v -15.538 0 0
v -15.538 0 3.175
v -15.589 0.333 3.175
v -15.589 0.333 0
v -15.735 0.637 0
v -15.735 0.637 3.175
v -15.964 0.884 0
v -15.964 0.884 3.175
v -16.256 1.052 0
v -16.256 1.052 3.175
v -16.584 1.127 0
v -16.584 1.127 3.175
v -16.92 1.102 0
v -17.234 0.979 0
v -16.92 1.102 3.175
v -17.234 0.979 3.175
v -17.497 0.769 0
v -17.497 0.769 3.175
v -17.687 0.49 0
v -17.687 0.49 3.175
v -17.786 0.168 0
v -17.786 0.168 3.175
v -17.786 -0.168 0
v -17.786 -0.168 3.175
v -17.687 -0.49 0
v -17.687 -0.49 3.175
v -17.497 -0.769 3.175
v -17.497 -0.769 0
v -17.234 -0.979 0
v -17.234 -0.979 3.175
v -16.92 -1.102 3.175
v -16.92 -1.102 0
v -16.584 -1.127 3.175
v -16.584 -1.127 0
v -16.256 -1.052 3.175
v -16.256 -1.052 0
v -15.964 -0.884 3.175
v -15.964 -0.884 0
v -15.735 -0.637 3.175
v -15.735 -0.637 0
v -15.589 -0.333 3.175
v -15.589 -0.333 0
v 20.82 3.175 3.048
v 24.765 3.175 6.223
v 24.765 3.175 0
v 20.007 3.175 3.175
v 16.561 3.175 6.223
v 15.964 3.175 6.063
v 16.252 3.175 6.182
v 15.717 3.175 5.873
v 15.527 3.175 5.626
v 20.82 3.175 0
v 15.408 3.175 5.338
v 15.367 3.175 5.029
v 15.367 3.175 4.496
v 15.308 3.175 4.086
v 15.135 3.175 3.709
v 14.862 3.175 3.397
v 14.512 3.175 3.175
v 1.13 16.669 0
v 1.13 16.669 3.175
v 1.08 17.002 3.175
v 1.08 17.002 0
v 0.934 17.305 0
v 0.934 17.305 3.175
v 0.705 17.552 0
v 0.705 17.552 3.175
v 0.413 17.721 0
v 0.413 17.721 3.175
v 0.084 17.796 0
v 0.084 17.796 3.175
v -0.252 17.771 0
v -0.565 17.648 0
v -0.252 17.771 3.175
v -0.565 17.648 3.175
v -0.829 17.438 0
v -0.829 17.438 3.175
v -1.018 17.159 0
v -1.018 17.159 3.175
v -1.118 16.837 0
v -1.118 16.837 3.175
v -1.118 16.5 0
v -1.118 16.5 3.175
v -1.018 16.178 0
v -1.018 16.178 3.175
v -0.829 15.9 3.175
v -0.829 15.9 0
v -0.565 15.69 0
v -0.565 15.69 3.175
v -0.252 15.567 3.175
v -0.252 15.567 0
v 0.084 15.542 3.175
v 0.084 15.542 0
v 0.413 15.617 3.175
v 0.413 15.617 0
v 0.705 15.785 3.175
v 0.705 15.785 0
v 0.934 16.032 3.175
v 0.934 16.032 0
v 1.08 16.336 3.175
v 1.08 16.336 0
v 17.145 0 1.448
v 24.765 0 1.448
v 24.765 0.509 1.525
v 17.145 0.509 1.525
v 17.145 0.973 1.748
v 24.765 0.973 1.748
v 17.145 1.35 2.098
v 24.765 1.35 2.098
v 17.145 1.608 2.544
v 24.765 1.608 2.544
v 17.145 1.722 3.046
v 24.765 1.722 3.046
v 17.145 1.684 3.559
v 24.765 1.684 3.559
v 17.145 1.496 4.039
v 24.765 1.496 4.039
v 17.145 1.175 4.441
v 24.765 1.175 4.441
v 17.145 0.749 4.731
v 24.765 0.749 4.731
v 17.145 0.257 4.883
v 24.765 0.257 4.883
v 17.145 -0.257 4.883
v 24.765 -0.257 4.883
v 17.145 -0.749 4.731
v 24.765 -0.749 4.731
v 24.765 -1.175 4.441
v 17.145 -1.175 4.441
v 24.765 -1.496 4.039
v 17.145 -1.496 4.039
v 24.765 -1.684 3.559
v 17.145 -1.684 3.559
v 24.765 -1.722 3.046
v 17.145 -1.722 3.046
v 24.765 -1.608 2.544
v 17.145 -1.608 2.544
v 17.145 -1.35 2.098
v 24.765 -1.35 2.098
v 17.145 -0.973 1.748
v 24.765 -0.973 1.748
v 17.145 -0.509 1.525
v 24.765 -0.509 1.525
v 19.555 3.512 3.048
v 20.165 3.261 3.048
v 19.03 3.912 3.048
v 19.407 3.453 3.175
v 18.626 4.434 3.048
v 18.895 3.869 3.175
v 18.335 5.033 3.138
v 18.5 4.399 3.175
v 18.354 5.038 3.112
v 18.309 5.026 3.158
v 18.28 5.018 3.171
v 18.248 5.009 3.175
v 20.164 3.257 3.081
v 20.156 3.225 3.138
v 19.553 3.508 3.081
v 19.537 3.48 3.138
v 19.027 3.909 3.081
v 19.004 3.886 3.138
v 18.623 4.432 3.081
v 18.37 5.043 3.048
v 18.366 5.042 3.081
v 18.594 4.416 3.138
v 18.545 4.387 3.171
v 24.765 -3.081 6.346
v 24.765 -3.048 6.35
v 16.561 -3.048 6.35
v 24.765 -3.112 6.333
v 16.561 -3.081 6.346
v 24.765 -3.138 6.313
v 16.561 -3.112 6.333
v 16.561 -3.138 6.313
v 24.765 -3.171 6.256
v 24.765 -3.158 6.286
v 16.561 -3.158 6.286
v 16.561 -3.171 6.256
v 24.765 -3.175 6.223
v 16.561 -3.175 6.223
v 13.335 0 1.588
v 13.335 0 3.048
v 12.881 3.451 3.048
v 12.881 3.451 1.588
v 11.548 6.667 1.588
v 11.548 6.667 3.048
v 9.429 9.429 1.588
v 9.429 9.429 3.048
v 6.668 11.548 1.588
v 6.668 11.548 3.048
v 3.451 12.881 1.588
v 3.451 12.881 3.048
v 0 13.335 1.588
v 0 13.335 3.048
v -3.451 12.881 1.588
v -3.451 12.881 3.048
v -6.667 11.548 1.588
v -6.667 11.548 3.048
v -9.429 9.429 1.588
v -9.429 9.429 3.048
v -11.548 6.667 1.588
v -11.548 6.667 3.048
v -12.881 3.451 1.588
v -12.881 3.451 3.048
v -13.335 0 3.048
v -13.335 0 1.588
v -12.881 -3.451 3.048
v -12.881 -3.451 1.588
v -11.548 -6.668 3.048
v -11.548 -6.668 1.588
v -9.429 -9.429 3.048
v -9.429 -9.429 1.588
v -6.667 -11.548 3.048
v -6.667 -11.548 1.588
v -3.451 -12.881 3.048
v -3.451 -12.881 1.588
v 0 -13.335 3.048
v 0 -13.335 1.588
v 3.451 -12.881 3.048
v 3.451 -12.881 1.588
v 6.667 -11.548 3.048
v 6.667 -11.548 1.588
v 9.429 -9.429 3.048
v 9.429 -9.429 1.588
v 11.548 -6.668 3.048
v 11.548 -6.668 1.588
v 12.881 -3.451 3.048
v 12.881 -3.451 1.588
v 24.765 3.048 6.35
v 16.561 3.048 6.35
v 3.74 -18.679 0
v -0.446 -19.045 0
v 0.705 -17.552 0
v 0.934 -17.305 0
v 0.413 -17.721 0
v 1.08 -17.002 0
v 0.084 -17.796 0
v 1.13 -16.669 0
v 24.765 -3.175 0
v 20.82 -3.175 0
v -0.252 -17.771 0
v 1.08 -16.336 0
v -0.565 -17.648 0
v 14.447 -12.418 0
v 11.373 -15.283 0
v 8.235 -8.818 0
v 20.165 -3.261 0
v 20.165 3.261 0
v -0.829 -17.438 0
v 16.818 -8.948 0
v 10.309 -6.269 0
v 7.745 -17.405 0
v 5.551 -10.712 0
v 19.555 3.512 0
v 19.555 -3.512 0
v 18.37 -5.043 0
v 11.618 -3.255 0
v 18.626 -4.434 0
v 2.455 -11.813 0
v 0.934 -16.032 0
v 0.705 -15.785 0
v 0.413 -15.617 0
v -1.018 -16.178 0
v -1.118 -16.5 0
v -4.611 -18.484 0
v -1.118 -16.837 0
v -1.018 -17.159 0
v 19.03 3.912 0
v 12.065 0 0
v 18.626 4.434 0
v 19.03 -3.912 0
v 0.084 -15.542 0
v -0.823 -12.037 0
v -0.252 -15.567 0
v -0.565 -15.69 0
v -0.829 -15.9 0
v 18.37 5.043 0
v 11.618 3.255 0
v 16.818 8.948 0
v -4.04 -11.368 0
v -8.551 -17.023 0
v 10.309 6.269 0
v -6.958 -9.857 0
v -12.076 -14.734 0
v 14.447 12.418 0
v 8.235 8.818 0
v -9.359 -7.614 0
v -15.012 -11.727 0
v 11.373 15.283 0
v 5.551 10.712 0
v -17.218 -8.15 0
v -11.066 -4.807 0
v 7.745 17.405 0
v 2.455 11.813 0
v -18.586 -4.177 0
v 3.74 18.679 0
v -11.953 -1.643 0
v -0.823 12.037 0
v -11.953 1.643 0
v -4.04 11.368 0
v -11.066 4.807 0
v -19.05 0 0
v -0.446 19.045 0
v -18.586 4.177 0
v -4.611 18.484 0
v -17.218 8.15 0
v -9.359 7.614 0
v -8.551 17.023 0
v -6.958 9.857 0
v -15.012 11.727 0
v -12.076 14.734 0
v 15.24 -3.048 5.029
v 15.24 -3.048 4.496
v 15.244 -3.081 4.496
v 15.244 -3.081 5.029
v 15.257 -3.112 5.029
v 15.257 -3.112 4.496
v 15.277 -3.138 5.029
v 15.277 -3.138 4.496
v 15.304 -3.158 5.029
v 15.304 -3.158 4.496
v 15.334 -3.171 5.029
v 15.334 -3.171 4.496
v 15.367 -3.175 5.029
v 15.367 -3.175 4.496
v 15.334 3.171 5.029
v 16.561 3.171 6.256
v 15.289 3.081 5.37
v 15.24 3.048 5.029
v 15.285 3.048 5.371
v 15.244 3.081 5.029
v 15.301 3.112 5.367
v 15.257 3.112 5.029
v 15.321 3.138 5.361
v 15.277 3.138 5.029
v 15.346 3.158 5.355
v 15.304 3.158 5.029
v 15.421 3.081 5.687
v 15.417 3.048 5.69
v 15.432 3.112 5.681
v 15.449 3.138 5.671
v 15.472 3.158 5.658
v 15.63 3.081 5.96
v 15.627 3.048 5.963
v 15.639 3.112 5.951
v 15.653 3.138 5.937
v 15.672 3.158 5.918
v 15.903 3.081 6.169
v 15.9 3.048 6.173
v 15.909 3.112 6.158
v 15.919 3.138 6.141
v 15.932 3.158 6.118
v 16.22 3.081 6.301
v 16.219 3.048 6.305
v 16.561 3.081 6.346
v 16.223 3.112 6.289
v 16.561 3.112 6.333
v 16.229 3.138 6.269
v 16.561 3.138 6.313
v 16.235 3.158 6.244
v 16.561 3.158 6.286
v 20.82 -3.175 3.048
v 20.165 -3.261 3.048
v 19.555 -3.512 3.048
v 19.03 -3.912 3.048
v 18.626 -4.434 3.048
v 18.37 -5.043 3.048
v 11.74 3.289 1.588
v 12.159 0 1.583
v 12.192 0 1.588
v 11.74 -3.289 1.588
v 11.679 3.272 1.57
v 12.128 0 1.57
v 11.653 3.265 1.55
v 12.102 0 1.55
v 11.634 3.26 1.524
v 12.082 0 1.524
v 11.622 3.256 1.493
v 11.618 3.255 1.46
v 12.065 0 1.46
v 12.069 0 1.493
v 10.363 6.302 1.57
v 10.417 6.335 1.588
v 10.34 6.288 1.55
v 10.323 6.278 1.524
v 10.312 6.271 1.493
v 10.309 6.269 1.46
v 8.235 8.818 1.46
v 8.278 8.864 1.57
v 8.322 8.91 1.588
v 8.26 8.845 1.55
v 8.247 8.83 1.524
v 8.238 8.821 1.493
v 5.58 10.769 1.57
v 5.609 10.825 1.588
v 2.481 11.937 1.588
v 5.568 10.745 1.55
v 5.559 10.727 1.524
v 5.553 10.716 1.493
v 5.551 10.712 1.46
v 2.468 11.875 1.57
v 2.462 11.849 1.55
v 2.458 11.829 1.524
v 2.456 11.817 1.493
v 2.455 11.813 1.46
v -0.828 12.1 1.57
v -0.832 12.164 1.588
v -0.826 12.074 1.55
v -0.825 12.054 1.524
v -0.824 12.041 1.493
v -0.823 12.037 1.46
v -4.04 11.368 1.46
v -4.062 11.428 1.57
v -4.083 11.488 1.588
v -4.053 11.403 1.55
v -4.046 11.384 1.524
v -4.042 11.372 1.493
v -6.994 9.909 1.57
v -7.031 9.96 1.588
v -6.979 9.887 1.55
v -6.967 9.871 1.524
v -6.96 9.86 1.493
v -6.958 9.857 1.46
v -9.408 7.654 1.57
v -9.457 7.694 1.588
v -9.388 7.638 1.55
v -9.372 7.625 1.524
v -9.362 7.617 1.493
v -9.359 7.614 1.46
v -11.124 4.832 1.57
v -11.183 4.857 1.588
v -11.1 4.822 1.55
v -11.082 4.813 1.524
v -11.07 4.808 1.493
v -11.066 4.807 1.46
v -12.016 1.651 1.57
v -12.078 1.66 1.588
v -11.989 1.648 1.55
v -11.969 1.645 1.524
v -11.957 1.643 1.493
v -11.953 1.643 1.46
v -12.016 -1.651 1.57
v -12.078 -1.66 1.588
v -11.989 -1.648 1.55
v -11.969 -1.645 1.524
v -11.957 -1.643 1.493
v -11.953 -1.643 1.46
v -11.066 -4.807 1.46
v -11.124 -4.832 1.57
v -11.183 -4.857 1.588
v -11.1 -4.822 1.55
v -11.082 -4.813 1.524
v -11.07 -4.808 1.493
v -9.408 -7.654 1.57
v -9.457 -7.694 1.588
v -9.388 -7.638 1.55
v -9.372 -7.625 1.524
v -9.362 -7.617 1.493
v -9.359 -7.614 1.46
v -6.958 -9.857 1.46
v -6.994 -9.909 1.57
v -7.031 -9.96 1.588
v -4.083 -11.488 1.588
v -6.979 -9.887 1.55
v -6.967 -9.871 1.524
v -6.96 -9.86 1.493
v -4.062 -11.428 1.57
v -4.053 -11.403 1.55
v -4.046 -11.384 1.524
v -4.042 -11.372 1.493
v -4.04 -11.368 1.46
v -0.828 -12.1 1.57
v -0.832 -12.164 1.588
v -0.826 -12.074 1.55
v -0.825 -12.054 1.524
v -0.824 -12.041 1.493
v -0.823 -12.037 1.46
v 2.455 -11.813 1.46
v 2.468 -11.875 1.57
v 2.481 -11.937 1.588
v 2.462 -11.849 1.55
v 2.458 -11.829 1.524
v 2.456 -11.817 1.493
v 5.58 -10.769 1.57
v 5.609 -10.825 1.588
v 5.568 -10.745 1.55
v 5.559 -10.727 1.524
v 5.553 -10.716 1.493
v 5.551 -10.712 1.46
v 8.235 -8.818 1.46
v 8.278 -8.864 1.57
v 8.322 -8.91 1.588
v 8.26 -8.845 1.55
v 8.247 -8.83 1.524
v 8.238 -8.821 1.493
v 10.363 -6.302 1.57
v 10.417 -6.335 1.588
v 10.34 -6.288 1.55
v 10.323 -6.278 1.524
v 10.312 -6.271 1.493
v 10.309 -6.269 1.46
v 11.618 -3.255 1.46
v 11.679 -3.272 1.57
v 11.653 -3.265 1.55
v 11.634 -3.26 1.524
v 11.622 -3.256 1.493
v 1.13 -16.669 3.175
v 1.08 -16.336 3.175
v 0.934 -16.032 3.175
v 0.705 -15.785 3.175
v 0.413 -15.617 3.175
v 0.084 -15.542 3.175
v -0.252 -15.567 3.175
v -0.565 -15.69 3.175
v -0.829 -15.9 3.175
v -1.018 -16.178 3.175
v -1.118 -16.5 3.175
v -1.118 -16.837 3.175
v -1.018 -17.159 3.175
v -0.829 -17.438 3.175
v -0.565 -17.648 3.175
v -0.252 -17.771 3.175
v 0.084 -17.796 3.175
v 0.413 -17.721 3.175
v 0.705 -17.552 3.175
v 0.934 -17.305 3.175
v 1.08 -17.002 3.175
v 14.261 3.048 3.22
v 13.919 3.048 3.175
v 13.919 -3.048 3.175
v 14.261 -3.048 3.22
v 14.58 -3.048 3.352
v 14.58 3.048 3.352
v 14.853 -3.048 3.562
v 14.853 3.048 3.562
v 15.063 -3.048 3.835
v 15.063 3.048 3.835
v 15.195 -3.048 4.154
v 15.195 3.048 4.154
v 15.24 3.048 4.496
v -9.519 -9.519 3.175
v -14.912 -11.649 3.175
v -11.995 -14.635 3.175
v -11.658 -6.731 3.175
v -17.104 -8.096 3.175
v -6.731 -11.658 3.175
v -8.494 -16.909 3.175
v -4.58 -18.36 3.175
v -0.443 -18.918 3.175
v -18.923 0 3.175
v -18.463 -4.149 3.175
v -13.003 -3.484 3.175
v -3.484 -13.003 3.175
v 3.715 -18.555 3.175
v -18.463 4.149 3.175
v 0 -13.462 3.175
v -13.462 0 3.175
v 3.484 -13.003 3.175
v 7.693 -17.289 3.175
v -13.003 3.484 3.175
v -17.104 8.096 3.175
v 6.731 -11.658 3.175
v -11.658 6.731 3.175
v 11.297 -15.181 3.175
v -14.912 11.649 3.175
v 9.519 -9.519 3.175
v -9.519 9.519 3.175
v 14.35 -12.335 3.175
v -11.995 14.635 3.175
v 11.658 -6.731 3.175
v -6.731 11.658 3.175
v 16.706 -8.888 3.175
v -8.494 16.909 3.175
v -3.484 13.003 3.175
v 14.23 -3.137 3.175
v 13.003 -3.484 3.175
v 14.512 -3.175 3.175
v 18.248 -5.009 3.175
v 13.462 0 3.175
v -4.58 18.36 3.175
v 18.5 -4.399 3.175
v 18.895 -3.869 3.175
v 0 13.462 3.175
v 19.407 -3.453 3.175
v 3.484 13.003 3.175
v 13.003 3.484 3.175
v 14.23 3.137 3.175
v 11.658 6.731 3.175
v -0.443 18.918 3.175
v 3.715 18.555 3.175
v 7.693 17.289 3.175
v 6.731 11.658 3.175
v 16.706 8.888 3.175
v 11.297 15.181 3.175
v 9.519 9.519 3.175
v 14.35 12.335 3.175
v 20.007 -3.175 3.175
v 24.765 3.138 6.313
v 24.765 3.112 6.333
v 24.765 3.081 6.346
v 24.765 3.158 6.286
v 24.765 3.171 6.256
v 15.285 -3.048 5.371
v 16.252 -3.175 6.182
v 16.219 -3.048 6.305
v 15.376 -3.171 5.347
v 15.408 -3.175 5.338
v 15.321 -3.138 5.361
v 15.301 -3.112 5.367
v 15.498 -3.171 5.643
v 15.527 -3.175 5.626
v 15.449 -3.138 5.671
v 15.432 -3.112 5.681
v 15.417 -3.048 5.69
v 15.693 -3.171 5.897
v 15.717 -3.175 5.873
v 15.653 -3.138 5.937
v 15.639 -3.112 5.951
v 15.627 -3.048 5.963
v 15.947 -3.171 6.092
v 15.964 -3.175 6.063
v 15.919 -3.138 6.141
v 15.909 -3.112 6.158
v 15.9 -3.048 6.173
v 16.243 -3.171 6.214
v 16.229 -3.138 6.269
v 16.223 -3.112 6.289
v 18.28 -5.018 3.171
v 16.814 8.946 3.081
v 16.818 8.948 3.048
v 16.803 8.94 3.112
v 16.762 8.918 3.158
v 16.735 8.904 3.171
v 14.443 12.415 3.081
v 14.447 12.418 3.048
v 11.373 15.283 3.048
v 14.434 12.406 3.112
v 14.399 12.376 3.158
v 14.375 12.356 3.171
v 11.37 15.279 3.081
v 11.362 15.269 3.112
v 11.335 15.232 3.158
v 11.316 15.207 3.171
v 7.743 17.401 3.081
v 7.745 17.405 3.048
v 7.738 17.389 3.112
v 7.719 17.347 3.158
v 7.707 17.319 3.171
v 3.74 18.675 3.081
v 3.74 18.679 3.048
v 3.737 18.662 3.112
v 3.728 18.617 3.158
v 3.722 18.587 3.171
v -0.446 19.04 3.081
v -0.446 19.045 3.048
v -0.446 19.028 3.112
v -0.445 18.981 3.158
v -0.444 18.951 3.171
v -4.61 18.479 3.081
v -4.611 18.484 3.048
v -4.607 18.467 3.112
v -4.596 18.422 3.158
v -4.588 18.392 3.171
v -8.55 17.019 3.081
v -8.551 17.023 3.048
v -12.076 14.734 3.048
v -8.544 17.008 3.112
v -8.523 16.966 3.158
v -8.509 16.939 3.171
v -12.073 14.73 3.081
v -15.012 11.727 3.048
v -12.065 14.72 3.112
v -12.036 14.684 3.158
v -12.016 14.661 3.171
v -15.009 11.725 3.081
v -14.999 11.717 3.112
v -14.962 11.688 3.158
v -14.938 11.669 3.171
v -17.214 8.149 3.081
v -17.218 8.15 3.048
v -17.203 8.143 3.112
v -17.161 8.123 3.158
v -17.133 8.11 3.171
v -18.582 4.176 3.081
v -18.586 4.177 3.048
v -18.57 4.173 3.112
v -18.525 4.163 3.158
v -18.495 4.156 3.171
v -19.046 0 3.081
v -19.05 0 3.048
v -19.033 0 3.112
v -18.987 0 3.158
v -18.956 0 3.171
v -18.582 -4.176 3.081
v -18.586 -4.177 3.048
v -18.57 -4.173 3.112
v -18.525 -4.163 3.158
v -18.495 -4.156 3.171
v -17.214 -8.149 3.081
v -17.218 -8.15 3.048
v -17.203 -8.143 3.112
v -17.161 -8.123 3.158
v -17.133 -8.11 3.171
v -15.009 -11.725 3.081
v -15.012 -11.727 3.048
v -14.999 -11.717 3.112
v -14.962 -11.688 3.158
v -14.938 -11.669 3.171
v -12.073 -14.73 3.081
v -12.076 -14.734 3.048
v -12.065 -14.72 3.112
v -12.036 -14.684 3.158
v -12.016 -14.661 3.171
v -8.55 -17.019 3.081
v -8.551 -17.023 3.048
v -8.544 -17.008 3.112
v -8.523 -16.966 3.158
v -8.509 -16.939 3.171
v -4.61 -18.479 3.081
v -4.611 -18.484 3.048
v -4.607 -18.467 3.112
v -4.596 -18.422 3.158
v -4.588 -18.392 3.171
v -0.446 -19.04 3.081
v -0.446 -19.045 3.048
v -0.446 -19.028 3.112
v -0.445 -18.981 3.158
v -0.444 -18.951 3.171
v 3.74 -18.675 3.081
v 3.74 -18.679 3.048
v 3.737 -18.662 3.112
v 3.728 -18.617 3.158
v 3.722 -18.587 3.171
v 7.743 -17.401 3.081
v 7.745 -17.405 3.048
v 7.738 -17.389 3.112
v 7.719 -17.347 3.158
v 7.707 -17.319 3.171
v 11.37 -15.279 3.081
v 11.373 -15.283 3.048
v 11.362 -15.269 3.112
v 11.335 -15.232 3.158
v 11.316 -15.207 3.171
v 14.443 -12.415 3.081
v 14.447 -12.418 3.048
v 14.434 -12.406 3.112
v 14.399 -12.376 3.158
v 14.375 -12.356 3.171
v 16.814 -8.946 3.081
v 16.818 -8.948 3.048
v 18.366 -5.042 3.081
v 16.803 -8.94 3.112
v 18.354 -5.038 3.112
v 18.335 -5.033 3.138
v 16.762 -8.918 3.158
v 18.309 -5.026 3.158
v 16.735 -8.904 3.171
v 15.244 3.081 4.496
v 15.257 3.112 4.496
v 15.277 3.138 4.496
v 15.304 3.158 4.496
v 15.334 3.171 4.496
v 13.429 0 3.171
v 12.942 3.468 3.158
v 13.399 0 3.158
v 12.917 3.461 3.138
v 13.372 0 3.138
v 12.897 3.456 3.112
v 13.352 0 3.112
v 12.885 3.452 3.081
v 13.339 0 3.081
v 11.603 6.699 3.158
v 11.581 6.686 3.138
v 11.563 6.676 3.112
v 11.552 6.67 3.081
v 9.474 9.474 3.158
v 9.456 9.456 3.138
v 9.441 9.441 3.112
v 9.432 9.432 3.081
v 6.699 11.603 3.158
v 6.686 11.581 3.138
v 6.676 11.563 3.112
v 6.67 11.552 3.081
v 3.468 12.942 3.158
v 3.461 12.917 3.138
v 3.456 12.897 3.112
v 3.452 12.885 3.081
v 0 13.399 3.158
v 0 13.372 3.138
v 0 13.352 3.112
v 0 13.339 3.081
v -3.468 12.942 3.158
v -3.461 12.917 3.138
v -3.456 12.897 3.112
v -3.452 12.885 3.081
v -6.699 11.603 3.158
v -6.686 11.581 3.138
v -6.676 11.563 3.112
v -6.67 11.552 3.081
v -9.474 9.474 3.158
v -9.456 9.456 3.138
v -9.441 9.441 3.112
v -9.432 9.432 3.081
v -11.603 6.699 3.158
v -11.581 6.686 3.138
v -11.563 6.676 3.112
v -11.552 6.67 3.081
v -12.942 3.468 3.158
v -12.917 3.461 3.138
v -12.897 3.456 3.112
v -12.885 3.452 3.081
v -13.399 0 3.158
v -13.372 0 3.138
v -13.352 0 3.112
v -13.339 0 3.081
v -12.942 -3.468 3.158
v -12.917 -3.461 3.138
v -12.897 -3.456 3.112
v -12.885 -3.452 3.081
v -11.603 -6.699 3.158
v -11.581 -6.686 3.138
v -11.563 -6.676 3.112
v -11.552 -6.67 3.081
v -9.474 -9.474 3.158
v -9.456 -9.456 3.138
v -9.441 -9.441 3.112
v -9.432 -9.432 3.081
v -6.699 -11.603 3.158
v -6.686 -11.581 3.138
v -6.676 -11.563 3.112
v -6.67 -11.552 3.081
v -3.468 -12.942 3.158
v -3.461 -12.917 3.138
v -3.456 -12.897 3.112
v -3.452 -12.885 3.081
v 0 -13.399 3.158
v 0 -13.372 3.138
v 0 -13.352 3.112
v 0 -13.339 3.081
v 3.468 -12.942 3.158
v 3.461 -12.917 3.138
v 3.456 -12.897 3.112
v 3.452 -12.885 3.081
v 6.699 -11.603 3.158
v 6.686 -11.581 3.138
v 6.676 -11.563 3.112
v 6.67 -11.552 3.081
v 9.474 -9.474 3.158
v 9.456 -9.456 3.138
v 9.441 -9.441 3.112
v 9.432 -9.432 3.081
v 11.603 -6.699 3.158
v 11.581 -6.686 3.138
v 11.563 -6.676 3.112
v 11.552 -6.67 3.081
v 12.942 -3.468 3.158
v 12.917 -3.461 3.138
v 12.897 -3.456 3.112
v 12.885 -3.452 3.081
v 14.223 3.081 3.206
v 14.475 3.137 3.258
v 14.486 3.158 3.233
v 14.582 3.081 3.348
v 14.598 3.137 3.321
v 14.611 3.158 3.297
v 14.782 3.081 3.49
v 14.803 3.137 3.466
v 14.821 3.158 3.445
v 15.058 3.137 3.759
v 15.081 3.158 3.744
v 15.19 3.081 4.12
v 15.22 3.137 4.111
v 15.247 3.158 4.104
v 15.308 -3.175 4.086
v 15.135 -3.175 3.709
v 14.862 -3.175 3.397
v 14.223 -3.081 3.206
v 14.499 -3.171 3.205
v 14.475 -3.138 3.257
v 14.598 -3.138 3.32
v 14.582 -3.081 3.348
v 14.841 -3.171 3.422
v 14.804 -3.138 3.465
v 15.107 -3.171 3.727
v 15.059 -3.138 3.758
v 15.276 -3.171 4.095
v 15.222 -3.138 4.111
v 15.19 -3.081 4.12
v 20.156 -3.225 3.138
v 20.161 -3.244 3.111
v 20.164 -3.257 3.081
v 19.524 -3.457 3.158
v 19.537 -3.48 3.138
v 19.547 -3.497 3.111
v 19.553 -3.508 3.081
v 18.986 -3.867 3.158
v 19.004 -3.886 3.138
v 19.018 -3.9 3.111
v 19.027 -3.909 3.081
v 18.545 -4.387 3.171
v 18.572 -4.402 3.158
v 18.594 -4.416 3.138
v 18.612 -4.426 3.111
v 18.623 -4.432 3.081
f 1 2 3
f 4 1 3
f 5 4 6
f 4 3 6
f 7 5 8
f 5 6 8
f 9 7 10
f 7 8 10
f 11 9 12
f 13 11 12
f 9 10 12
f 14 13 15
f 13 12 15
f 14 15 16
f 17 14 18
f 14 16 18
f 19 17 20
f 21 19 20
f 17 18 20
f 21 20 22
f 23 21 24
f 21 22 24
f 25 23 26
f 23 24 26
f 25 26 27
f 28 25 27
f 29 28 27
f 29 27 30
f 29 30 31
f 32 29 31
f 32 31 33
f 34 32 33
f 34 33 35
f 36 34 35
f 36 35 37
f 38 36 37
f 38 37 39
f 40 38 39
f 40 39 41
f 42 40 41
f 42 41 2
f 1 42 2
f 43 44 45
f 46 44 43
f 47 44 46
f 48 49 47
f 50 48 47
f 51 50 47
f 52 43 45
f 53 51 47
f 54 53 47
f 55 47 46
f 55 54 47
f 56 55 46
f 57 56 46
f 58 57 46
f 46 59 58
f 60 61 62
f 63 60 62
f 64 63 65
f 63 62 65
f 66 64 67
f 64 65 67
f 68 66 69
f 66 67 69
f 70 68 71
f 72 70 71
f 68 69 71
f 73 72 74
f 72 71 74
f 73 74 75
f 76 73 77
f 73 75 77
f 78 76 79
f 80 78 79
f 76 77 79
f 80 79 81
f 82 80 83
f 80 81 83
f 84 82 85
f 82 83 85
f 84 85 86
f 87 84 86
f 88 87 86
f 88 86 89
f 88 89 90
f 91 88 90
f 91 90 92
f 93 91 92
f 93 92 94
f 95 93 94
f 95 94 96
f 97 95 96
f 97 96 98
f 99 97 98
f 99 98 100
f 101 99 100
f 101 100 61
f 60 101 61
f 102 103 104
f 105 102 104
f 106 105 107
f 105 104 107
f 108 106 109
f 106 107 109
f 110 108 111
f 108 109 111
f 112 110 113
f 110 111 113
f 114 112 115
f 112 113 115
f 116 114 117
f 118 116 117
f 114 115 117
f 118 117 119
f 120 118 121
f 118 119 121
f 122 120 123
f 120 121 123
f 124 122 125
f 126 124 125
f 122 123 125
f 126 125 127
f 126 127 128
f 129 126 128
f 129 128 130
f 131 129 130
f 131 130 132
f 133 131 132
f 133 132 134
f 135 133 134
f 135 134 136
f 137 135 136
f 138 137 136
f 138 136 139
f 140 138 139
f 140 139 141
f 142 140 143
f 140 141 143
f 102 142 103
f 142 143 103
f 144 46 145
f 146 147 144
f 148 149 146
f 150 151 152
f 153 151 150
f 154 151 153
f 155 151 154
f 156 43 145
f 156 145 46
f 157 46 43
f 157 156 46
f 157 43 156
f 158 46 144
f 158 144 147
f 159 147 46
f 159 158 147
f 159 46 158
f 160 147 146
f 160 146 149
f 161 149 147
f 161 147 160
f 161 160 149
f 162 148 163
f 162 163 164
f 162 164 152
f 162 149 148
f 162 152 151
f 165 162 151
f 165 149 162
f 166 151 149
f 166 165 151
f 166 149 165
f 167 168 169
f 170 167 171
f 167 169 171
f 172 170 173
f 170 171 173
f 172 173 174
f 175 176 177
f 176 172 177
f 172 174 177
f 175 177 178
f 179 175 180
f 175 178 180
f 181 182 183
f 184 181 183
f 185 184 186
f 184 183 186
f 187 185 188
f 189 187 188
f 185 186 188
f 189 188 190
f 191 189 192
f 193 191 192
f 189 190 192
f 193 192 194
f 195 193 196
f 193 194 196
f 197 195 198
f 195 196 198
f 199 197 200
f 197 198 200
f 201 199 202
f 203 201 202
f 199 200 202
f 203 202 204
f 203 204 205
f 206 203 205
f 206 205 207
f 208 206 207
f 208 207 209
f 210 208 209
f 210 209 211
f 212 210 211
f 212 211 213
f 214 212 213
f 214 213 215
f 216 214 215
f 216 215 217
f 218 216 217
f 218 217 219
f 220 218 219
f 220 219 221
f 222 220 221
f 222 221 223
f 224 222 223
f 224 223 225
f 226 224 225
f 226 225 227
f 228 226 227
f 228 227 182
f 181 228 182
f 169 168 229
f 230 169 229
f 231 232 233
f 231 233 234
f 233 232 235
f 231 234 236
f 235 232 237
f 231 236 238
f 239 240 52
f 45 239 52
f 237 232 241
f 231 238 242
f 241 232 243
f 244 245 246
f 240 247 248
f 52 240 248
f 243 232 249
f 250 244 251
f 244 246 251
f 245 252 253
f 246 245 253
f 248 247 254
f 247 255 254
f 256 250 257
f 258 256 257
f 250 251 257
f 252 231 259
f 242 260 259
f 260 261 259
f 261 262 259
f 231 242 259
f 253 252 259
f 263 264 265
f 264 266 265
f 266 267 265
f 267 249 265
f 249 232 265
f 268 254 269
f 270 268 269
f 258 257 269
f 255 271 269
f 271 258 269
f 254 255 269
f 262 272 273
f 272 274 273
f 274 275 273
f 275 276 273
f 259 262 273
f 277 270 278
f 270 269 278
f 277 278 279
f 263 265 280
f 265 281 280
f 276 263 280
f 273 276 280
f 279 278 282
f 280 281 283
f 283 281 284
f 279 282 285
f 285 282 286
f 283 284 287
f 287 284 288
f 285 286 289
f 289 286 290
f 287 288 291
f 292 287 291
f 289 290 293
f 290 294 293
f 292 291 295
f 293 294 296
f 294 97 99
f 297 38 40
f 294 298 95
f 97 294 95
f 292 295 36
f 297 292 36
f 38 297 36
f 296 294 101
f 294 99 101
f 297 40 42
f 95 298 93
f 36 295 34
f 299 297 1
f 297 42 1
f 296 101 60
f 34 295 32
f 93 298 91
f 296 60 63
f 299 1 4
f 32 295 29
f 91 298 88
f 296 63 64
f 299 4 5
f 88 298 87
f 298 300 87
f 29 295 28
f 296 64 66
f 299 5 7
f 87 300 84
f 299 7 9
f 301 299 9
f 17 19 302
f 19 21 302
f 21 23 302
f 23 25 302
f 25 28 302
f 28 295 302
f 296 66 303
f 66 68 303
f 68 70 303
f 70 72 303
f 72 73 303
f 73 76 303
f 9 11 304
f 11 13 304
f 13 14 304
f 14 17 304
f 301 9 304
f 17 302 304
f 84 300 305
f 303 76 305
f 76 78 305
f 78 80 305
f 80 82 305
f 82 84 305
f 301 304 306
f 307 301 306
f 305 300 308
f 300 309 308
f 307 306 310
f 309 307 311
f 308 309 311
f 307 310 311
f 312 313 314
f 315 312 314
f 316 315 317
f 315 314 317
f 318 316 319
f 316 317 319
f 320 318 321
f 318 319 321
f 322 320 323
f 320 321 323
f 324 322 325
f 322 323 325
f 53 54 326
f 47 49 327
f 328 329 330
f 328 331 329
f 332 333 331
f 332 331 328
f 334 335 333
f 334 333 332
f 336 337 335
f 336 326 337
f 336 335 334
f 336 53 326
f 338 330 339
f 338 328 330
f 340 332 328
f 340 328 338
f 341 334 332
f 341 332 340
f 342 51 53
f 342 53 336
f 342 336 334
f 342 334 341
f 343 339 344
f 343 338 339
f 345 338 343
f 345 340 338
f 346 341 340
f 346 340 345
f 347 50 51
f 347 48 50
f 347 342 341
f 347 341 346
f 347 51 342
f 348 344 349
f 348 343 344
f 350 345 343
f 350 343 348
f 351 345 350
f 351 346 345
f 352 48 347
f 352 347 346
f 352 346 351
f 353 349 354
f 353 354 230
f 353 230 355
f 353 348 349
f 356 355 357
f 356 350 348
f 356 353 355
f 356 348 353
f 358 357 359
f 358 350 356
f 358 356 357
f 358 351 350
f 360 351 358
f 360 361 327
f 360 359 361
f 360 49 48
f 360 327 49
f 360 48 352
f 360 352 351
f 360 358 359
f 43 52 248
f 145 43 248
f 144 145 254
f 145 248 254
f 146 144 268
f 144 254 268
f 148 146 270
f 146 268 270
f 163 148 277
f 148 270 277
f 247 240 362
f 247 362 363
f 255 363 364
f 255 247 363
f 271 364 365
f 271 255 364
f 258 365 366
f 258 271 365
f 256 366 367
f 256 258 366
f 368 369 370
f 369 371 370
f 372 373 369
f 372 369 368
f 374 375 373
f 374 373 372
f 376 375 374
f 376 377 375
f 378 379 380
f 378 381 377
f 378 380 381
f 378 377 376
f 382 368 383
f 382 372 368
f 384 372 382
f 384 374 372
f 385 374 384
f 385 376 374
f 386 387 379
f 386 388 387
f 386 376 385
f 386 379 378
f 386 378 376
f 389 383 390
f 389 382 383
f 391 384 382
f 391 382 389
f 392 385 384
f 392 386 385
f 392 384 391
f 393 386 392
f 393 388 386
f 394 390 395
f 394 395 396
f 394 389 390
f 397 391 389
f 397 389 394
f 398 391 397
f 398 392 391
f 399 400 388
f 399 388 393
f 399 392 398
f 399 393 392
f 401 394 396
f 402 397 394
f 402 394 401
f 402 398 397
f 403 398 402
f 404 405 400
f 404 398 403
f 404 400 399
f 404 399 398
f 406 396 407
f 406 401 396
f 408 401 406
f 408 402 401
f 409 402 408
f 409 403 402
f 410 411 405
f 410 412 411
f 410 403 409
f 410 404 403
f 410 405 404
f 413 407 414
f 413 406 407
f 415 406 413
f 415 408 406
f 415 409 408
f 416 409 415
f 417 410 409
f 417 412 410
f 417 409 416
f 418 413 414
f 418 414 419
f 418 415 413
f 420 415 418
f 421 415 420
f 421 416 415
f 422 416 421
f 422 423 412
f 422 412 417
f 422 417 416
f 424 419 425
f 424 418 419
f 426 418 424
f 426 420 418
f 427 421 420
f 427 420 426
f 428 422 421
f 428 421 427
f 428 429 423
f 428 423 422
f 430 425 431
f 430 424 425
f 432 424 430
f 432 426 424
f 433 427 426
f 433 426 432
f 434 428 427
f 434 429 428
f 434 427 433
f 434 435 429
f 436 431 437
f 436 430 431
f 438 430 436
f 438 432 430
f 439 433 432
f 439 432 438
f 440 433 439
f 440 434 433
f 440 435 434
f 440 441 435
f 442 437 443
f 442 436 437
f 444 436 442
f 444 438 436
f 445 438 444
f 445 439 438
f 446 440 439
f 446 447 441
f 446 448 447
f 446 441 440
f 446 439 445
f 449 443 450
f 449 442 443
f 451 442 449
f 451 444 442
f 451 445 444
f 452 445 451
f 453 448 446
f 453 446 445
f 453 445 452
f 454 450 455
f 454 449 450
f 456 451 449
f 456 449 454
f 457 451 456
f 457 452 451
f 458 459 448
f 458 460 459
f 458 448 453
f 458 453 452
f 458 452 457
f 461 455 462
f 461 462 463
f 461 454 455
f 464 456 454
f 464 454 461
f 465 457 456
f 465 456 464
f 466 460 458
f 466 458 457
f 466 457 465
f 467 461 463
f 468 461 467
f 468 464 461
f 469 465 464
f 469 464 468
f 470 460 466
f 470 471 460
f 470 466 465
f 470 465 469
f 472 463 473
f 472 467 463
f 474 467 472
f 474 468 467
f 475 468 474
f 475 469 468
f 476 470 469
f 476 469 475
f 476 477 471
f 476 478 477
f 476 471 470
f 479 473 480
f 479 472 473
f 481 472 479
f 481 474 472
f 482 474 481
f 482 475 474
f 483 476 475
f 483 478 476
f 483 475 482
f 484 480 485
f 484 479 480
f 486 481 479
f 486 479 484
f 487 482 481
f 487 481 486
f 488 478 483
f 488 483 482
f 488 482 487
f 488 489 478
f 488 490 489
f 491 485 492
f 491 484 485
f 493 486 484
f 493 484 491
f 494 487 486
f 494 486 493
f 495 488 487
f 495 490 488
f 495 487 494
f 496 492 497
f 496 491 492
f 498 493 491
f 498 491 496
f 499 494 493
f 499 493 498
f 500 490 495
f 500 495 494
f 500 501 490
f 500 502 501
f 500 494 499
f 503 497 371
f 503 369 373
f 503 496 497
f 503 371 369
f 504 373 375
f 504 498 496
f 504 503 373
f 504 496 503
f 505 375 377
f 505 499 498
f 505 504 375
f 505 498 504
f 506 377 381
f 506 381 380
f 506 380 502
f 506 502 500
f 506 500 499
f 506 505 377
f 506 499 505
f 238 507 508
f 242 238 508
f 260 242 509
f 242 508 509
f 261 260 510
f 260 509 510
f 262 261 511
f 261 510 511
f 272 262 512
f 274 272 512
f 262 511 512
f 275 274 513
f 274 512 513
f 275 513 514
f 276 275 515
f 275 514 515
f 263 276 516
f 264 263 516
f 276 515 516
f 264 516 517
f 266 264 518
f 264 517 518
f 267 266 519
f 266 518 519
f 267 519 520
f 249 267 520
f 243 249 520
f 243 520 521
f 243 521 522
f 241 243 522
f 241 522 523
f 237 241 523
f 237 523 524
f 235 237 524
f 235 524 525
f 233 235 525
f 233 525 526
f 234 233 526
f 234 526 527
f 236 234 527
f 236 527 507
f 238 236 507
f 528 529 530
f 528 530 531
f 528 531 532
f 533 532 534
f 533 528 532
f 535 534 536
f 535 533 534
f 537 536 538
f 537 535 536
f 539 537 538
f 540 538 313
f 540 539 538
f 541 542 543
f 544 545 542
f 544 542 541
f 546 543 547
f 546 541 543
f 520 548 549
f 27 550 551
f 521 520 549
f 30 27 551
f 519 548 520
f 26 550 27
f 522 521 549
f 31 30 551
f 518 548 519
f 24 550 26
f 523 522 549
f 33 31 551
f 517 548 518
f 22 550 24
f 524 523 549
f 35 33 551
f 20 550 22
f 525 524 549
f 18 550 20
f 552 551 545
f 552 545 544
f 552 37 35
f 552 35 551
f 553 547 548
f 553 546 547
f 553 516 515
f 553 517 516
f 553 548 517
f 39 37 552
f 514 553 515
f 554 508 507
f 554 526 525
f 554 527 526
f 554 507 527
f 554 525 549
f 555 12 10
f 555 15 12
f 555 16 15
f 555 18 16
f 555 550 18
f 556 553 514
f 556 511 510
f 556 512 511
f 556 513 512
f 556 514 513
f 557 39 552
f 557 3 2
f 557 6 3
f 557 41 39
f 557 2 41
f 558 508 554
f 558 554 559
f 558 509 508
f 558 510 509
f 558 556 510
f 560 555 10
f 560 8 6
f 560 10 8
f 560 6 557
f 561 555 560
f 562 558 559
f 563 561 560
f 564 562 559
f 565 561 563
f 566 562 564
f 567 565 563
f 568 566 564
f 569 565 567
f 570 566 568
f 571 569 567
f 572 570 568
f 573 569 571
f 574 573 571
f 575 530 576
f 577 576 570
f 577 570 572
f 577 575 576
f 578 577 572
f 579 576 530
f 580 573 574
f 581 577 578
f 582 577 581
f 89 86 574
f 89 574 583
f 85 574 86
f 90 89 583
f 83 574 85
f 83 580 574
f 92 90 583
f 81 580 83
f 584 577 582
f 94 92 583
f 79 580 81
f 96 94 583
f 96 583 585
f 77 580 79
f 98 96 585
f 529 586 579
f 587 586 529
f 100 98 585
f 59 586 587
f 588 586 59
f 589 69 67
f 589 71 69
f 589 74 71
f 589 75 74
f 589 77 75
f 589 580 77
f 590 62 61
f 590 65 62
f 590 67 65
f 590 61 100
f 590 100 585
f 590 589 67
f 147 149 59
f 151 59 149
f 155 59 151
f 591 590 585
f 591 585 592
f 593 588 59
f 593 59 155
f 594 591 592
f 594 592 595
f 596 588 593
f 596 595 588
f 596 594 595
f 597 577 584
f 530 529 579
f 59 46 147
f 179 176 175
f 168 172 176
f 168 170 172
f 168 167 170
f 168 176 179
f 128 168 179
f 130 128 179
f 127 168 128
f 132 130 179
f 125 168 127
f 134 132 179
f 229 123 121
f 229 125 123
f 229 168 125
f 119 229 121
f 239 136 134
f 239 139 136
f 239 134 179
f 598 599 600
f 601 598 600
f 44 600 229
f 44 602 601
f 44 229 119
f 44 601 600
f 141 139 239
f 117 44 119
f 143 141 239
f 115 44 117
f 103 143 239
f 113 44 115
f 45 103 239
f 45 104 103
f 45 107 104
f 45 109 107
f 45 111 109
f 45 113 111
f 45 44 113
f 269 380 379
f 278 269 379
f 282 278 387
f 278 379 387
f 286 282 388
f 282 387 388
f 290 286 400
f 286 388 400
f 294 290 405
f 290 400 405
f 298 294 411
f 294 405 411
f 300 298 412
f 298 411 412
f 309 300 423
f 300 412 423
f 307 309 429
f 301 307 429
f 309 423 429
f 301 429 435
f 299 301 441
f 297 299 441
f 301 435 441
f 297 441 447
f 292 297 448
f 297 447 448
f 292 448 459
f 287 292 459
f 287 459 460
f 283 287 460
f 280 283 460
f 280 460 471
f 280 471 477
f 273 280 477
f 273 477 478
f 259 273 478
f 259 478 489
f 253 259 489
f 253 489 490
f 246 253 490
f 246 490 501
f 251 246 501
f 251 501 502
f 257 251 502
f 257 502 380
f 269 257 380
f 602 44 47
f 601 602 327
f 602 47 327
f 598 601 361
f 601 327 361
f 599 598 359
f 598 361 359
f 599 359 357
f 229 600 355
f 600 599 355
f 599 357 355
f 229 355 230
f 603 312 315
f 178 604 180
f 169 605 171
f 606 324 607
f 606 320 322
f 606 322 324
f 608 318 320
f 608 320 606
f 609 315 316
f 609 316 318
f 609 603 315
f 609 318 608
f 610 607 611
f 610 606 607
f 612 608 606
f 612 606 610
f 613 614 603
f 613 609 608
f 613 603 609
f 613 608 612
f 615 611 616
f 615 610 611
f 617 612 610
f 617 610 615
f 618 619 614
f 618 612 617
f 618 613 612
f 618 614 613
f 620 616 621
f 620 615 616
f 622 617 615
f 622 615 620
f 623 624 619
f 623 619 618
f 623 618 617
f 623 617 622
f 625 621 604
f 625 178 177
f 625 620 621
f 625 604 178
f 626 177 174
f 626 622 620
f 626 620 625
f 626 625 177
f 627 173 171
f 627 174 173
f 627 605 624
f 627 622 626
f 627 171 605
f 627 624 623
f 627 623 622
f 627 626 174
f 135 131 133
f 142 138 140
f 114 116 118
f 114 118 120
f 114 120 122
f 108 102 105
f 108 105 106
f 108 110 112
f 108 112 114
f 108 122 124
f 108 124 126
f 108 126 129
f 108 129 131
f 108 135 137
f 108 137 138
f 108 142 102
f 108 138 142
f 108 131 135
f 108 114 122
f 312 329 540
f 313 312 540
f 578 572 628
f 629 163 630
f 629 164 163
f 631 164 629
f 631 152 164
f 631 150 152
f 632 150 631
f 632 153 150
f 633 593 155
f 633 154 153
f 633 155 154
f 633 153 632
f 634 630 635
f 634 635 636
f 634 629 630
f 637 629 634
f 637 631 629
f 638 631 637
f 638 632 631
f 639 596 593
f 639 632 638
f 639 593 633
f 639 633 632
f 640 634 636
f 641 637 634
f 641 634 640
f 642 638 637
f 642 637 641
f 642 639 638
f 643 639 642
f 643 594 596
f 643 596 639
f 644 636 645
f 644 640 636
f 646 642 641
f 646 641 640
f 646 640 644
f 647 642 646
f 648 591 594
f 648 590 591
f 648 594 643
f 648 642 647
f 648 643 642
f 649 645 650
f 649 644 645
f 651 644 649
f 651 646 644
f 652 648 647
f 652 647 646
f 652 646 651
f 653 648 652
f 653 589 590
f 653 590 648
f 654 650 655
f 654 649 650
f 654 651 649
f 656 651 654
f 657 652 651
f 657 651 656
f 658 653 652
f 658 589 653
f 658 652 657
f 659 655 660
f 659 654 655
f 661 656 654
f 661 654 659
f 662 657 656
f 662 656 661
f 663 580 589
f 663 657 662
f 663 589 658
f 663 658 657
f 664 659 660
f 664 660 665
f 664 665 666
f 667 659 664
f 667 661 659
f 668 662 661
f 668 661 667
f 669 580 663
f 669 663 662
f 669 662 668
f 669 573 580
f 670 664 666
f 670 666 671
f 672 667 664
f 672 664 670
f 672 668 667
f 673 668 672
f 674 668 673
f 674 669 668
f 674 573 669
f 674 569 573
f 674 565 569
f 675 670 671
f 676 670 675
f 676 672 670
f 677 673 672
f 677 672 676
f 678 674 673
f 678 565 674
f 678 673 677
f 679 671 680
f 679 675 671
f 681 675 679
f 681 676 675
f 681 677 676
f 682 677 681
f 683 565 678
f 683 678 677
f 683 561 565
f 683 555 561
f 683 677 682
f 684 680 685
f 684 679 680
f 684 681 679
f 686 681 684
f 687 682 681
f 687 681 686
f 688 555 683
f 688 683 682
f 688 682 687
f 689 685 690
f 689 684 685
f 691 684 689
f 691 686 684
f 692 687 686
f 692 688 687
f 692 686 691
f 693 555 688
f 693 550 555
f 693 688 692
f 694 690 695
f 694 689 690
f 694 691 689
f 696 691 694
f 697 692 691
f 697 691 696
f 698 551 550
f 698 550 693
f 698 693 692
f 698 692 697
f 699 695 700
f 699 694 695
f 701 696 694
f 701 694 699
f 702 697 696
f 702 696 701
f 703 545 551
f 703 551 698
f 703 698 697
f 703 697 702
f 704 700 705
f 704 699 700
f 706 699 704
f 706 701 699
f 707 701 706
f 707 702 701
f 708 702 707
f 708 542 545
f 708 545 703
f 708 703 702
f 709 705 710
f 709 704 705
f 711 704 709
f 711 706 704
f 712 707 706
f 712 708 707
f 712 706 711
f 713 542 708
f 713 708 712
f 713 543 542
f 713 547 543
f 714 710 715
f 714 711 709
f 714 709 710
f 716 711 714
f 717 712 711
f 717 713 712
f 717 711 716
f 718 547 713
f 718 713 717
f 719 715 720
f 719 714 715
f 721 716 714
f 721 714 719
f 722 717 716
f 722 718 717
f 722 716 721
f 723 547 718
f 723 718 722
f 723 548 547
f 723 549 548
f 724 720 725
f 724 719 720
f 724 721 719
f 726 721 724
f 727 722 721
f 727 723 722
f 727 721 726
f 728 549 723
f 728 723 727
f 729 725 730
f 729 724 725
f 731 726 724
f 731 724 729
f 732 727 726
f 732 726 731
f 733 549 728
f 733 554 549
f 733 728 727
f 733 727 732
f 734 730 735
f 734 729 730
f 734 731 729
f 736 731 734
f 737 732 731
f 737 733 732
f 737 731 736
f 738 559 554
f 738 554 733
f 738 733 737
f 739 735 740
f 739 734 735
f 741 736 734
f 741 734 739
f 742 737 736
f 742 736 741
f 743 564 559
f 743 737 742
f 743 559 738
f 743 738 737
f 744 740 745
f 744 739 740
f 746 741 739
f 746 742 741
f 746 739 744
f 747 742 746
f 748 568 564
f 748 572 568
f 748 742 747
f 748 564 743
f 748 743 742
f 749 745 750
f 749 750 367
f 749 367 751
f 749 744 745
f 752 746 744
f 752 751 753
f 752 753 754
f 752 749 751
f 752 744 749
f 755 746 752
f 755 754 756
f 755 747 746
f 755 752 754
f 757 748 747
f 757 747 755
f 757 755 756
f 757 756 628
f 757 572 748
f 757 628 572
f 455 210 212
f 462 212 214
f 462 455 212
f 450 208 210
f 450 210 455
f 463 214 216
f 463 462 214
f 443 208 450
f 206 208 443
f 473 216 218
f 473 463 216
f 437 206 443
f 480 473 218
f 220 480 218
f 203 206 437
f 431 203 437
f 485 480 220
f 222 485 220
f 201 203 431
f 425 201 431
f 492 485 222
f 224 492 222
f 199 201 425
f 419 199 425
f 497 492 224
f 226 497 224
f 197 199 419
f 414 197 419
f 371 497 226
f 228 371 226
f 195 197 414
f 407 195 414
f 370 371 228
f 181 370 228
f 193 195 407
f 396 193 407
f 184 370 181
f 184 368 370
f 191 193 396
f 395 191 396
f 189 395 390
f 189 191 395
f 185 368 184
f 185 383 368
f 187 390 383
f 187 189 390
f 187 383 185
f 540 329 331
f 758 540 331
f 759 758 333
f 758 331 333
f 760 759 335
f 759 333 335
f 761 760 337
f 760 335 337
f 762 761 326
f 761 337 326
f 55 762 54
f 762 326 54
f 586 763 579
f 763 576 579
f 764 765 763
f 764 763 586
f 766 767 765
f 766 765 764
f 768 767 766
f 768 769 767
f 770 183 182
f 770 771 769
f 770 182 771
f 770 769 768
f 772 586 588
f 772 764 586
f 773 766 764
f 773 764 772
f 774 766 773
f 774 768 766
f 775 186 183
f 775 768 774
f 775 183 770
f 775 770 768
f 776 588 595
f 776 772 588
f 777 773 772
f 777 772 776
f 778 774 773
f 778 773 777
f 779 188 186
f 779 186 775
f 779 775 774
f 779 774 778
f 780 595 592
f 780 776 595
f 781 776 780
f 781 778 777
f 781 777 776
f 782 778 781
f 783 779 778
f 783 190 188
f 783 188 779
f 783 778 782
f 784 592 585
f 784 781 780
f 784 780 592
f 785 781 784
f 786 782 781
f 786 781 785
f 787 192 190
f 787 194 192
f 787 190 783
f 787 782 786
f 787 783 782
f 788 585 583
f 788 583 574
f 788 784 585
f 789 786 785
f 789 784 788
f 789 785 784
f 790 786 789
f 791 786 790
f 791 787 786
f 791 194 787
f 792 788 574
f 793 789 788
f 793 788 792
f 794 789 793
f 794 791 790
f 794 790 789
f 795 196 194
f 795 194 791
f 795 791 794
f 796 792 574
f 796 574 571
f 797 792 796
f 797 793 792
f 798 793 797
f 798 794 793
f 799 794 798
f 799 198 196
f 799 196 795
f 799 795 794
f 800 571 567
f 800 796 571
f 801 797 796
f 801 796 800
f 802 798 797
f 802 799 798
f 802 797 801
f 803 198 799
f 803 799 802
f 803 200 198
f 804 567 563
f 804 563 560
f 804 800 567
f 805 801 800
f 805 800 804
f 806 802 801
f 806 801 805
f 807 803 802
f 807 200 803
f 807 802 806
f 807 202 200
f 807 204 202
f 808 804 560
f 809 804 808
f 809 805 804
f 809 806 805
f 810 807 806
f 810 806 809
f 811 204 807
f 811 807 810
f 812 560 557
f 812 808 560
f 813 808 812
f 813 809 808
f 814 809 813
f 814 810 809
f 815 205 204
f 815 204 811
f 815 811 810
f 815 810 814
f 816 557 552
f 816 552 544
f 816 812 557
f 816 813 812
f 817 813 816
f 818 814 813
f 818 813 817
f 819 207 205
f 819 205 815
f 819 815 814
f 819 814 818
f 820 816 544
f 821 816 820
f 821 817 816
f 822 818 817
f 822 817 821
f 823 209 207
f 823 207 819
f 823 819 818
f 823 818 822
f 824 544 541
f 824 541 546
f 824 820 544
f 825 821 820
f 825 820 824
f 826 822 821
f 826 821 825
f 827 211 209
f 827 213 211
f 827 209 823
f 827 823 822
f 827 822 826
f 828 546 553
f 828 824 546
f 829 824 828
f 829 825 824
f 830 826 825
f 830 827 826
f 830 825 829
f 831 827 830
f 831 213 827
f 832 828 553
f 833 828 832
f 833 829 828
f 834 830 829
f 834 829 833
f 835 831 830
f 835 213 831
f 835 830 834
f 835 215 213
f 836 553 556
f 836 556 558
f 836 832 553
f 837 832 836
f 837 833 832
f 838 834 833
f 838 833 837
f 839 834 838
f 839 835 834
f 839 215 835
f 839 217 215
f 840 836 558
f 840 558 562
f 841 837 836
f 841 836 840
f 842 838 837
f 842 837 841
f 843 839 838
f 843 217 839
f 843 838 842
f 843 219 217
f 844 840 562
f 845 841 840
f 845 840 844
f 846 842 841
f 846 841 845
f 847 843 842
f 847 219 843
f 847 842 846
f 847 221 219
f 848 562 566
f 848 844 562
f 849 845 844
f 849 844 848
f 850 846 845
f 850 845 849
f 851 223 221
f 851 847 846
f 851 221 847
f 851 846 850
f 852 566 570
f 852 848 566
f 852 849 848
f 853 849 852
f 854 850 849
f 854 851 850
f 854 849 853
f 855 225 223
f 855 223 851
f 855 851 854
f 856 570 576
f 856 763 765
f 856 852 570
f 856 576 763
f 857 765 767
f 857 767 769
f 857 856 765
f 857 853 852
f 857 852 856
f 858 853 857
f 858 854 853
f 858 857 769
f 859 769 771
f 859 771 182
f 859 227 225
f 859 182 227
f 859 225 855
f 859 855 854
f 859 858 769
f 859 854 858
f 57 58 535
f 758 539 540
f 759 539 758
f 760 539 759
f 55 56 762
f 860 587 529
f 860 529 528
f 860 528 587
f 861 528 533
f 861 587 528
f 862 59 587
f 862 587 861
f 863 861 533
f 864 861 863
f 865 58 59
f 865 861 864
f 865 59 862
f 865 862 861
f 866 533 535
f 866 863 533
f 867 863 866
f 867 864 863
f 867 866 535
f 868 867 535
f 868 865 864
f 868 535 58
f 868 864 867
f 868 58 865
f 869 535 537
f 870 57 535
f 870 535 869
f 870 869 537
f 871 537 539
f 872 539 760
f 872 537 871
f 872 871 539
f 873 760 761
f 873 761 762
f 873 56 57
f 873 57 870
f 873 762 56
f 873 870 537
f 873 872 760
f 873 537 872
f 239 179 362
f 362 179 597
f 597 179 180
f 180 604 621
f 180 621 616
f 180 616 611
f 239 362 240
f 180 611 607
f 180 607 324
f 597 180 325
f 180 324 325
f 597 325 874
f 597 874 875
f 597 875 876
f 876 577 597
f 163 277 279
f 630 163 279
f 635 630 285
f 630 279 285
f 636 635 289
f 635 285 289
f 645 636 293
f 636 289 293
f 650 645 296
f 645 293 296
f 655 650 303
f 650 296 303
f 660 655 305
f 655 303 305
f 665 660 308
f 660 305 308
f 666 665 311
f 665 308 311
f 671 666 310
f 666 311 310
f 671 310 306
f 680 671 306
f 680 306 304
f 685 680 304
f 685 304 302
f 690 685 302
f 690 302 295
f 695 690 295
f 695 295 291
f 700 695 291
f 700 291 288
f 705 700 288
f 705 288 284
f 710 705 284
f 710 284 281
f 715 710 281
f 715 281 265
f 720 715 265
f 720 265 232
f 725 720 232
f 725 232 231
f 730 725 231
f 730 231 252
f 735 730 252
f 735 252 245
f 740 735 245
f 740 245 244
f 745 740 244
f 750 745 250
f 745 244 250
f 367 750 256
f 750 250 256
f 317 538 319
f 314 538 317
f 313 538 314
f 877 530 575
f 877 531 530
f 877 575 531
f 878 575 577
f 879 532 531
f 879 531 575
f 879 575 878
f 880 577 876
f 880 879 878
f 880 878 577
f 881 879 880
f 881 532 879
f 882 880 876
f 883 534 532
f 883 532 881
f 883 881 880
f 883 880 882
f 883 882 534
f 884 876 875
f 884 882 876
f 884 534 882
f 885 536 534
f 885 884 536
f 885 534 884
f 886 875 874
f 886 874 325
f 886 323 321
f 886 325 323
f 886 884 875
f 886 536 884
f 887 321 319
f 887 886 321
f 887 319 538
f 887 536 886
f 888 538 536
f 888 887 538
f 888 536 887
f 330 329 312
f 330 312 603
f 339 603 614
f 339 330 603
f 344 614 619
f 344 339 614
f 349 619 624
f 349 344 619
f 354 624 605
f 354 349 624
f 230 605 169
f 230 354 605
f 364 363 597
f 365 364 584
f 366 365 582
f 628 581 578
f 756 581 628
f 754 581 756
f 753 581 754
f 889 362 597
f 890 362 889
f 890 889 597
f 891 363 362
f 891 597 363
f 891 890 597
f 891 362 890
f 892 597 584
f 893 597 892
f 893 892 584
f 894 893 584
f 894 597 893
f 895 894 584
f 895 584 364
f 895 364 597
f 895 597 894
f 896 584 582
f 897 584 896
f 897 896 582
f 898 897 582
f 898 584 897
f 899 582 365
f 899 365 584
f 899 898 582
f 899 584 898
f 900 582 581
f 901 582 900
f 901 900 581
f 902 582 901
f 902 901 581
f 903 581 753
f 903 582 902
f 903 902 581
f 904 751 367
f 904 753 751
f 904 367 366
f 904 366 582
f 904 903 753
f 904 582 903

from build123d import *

# Parameters (mm, degrees)
SKETCH1_R           = 19.05
BOSS_EXTRUDE1_DEPTH = 3.175
SKETCH2_R           = 12.065
CUT_EXTRUDE1_DEPTH  = 28.127211891
SKETCH3_R           = 13.335
CUT_EXTRUDE2_DEPTH  = 1.5875
BOSS_EXTRUDE2_START = 15.24
SKETCH4_W           = 6.35
SKETCH4_H           = 6.35
BOSS_EXTRUDE2_DEPTH = 9.525
FILLET1_R           = 2.54
SKETCH5_R           = 1.7272
CUT_EXTRUDE3_DEPTH  = 7.62
FILLET2_R           = 1.3208
FILLET3_R           = 0.127
SKETCH6_R           = 1.1303
CUT_EXTRUDE4_DEPTH  = 32.405228218


with BuildPart() as part:
    # Sketch1 → Boss-Extrude1 (new body)
    with BuildSketch(Plane.XY):
        Circle(SKETCH1_R)
    extrude(amount=BOSS_EXTRUDE1_DEPTH)

    # Sketch2 → Cut-Extrude1 (cut, through all)
    with BuildSketch(Plane.XY.offset(3.175)):
        Circle(SKETCH2_R)
    extrude(amount=-CUT_EXTRUDE1_DEPTH, mode=Mode.SUBTRACT)

    # Sketch3 → Cut-Extrude2 (cut)
    with BuildSketch(Plane.XY.offset(3.175)):
        Circle(SKETCH3_R)
    extrude(amount=-CUT_EXTRUDE2_DEPTH, mode=Mode.SUBTRACT)

    # Sketch4 → Boss-Extrude2 (add)
    with BuildSketch(Plane(origin=(0, 0, 0), x_dir=(0, 0, -1), z_dir=(1, 0, 0)).offset(BOSS_EXTRUDE2_START)):
        with Locations((-3.175, 0)):
            Rectangle(SKETCH4_W, SKETCH4_H)
    extrude(amount=BOSS_EXTRUDE2_DEPTH)

    # Fillet1
    fillet1_edges = [part.edges().sort_by_distance(p)[0] for p in [
        (18.783553311, -3.175, 1.5875),
        (18.783553311, 3.175, 1.5875),
    ]]
    fillet(fillet1_edges, radius=FILLET1_R)

    # Sketch5 → Cut-Extrude3 (cut)
    with BuildSketch(Plane(origin=(24.765, 0, 0), x_dir=(0, 0, -1), z_dir=(1, 0, 0))):
        with Locations((-3.175, 0)):
            Circle(SKETCH5_R)
    extrude(amount=-CUT_EXTRUDE3_DEPTH, mode=Mode.SUBTRACT)

    # Fillet2
    fillet2_edges = [part.edges().sort_by_distance(p)[0] for p in [
        (15.24, 0, 3.175),
        (15.24, 0, 6.35),
    ]]
    fillet(fillet2_edges, radius=FILLET2_R)

    # Fillet3
    # the kernel refuses this fillet: 0.127 mm, written as the material it takes off along each edge
    with BuildSketch(Plane(origin=(0, 0, 3.175), x_dir=(1, 0, 0), z_dir=(0, -1, 0))) as fillet3_piece_1:
        with BuildLine():
            CenterArc((13.335 + FILLET3_R, -FILLET3_R), FILLET3_R, 90, 90)
            Line((13.335, -FILLET3_R), (13.335, 0))
            Line((13.335, 0), (13.335 + FILLET3_R, 0))
        make_face()
    revolve(axis=Axis((0, 0, 3.175), (0, 0, 1)), mode=Mode.SUBTRACT)
    with BuildSketch(Plane(origin=(0, 0, 1.5875), x_dir=(1, 0, 0), z_dir=(0, -1, 0))) as fillet3_piece_2:
        with BuildLine():
            CenterArc((12.065 + FILLET3_R, -FILLET3_R), FILLET3_R, 90, 90)
            Line((12.065, -FILLET3_R), (12.065, 0))
            Line((12.065, 0), (12.065 + FILLET3_R, 0))
        make_face()
    revolve(axis=Axis((0, 0, 1.5875), (0, 0, 1)), mode=Mode.SUBTRACT)
    with BuildSketch(Plane(origin=(16.5608, -3.175, 6.35), x_dir=(0, 0, -1), z_dir=(1, 0, 0))) as fillet3_piece_3:
        with BuildLine():
            CenterArc((FILLET3_R, FILLET3_R), FILLET3_R, 180, 90)
            Line((0, FILLET3_R), (0, 0))
            Line((0, 0), (FILLET3_R, 0))
        make_face()
    extrude(amount=8.5217, mode=Mode.SUBTRACT)
    with BuildSketch(Plane(origin=(16.5608, 3.175, 6.35), x_dir=(0, 0, -1), z_dir=(1, 0, 0))) as fillet3_piece_4:
        with BuildLine():
            CenterArc((FILLET3_R, -FILLET3_R), FILLET3_R, 90, 90)
            Line((0, -FILLET3_R), (0, 0))
            Line((0, 0), (FILLET3_R, 0))
        make_face()
    extrude(amount=8.5217, mode=Mode.SUBTRACT)
    with BuildSketch(Plane(origin=(0, 0, 3.175), x_dir=(0.9643291947502942, 0.2647058823529412, 0), z_dir=(0.2647058823529412, -0.9643291947502942, 0))) as fillet3_piece_5:
        with BuildLine():
            CenterArc((19.05 - FILLET3_R, -FILLET3_R), FILLET3_R, 0, 90)
            Line((19.05 - FILLET3_R, 0), (19.05, 0))
            Line((19.05, 0), (19.05, -FILLET3_R))
        make_face()
    revolve(axis=Axis((0, 0, 3.175), (0, 0, 1)), revolution_arc=329.301045966, mode=Mode.SUBTRACT)
    with BuildSketch(Plane(origin=(20.819867315, 5.715, 3.175), x_dir=(0.12470900704731759, -0.9921933599663284, 0), z_dir=(0.9921933599663284, 0.12470900704731759, 0))) as fillet3_piece_6_section:
        with BuildLine():
            CenterArc((2.54 + FILLET3_R, FILLET3_R), FILLET3_R, 180, 90)
            Line((2.54, FILLET3_R), (2.54, 0))
            Line((2.54, 0), (2.54 + FILLET3_R, 0))
        make_face()
    fillet3_piece_6 = revolve(axis=Axis((20.819867315, 5.715, 3.175), (0, 0, -1)), revolution_arc=81.814474605, mode=Mode.PRIVATE)
    fillet3_piece_6 = split(fillet3_piece_6, bisect_by=Plane(origin=(19.258112291, 3.175, 3.13928763), z_dir=(0, 1, 0)), keep=Keep.TOP, mode=Mode.PRIVATE)
    add(fillet3_piece_6, mode=Mode.SUBTRACT)
    with BuildSketch(Plane(origin=(20.819867315, -5.715, 3.175), x_dir=(0.12470900704731899, 0.9921933599663282, 0), z_dir=(0.9921933599663282, -0.12470900704731899, 0))) as fillet3_piece_7_section:
        with BuildLine():
            CenterArc((2.54 + FILLET3_R, -FILLET3_R), FILLET3_R, 90, 90)
            Line((2.54 + FILLET3_R, 0), (2.54, 0))
            Line((2.54, 0), (2.54, -FILLET3_R))
        make_face()
    fillet3_piece_7 = revolve(axis=Axis((20.819867315, -5.715, 3.175), (0, 0, 1)), revolution_arc=81.814474605, mode=Mode.PRIVATE)
    fillet3_piece_7 = split(fillet3_piece_7, bisect_by=Plane(origin=(19.258112291, -3.175, 3.13928763), z_dir=(0, -1, 0)), keep=Keep.TOP, mode=Mode.PRIVATE)
    add(fillet3_piece_7, mode=Mode.SUBTRACT)
    with BuildSketch(Plane(origin=(15.24, -3.175, 4.4958), x_dir=(1, 0, 0), z_dir=(0, 0, 1)), Plane(origin=(15.24, 3.175, 5.0292), x_dir=(1, 0, 0), z_dir=(0, 0, -1))) as fillet3_piece_8:
        with BuildLine():
            CenterArc((FILLET3_R, FILLET3_R), FILLET3_R, 180, 90)
            Line((0, FILLET3_R), (0, 0))
            Line((0, 0), (FILLET3_R, 0))
        make_face()
    extrude(amount=0.5334, mode=Mode.SUBTRACT)
    with BuildSketch(Plane(origin=(16.5608, -3.175, 5.0292), x_dir=(-1, 0, 0), z_dir=(0, 0, -1))) as fillet3_piece_9:
        with BuildLine():
            CenterArc((1.3208 - FILLET3_R, FILLET3_R), FILLET3_R, 270, 90)
            Line((1.3208, FILLET3_R), (1.3208, 0))
            Line((1.3208, 0), (1.3208 - FILLET3_R, 0))
        make_face()
    revolve(axis=Axis((16.5608, -3.175, 5.0292), (0, 1, 0)), revolution_arc=90, mode=Mode.SUBTRACT)
    with BuildSketch(Plane(origin=(16.5608, 3.175, 5.0292), x_dir=(-1, 0, 0), z_dir=(0, 0, -1))) as fillet3_piece_10:
        with BuildLine():
            CenterArc((1.3208 - FILLET3_R, -FILLET3_R), FILLET3_R, 0, 90)
            Line((1.3208, -FILLET3_R), (1.3208, 0))
            Line((1.3208, 0), (1.3208 - FILLET3_R, 0))
        make_face()
    revolve(axis=Axis((16.5608, 3.175, 5.0292), (0, 1, 0)), revolution_arc=90, mode=Mode.SUBTRACT)
    with BuildSketch(Plane(origin=(13.9192, 3.175, 4.4958), x_dir=(-0.23816998714710041, 0, -0.9712234846946144), z_dir=(-0.9712234846946144, 0, 0.23816998714710041))) as fillet3_piece_11_section:
        with BuildLine():
            CenterArc((1.3208 + FILLET3_R, FILLET3_R), FILLET3_R, 180, 90)
            Line((1.3208, FILLET3_R), (1.3208, 0))
            Line((1.3208, 0), (1.3208 + FILLET3_R, 0))
        make_face()
    fillet3_piece_11 = revolve(axis=Axis((13.9192, 3.175, 4.4958), (0, -1, 0)), revolution_arc=103.778556657, mode=Mode.PRIVATE)
    fillet3_piece_11 = split(fillet3_piece_11, bisect_by=Plane(origin=(14.878561501, 3.139057971, 3.175), z_dir=(0, 0, 1)), keep=Keep.TOP, mode=Mode.PRIVATE)
    add(fillet3_piece_11, mode=Mode.SUBTRACT)
    with BuildSketch(Plane(origin=(13.9192, -3.175, 4.4958), x_dir=(-0.23816998714710186, 0, -0.9712234846946141), z_dir=(-0.9712234846946141, 0, 0.23816998714710186))) as fillet3_piece_12_section:
        with BuildLine():
            CenterArc((1.3208 + FILLET3_R, -FILLET3_R), FILLET3_R, 90, 90)
            Line((1.3208 + FILLET3_R, 0), (1.3208, 0))
            Line((1.3208, 0), (1.3208, -FILLET3_R))
        make_face()
    fillet3_piece_12 = revolve(axis=Axis((13.9192, -3.175, 4.4958), (0, -1, 0)), revolution_arc=103.778556657, mode=Mode.PRIVATE)
    fillet3_piece_12 = split(fillet3_piece_12, bisect_by=Plane(origin=(14.878561477, -3.139057971, 3.175), z_dir=(0, 0, 1)), keep=Keep.TOP, mode=Mode.PRIVATE)
    add(fillet3_piece_12, mode=Mode.SUBTRACT)

    # Sketch6 → Cut-Extrude4 (cut, through all)
    with BuildSketch(Plane.XY.offset(3.175)):
        with Locations((-16.66875, 0)):
            Circle(SKETCH6_R)
        with Locations((0, 16.66875)):
            Circle(SKETCH6_R)
        with Locations((0, -16.66875)):
            Circle(SKETCH6_R)
    extrude(amount=-CUT_EXTRUDE4_DEPTH, mode=Mode.SUBTRACT)


solid = part.part
